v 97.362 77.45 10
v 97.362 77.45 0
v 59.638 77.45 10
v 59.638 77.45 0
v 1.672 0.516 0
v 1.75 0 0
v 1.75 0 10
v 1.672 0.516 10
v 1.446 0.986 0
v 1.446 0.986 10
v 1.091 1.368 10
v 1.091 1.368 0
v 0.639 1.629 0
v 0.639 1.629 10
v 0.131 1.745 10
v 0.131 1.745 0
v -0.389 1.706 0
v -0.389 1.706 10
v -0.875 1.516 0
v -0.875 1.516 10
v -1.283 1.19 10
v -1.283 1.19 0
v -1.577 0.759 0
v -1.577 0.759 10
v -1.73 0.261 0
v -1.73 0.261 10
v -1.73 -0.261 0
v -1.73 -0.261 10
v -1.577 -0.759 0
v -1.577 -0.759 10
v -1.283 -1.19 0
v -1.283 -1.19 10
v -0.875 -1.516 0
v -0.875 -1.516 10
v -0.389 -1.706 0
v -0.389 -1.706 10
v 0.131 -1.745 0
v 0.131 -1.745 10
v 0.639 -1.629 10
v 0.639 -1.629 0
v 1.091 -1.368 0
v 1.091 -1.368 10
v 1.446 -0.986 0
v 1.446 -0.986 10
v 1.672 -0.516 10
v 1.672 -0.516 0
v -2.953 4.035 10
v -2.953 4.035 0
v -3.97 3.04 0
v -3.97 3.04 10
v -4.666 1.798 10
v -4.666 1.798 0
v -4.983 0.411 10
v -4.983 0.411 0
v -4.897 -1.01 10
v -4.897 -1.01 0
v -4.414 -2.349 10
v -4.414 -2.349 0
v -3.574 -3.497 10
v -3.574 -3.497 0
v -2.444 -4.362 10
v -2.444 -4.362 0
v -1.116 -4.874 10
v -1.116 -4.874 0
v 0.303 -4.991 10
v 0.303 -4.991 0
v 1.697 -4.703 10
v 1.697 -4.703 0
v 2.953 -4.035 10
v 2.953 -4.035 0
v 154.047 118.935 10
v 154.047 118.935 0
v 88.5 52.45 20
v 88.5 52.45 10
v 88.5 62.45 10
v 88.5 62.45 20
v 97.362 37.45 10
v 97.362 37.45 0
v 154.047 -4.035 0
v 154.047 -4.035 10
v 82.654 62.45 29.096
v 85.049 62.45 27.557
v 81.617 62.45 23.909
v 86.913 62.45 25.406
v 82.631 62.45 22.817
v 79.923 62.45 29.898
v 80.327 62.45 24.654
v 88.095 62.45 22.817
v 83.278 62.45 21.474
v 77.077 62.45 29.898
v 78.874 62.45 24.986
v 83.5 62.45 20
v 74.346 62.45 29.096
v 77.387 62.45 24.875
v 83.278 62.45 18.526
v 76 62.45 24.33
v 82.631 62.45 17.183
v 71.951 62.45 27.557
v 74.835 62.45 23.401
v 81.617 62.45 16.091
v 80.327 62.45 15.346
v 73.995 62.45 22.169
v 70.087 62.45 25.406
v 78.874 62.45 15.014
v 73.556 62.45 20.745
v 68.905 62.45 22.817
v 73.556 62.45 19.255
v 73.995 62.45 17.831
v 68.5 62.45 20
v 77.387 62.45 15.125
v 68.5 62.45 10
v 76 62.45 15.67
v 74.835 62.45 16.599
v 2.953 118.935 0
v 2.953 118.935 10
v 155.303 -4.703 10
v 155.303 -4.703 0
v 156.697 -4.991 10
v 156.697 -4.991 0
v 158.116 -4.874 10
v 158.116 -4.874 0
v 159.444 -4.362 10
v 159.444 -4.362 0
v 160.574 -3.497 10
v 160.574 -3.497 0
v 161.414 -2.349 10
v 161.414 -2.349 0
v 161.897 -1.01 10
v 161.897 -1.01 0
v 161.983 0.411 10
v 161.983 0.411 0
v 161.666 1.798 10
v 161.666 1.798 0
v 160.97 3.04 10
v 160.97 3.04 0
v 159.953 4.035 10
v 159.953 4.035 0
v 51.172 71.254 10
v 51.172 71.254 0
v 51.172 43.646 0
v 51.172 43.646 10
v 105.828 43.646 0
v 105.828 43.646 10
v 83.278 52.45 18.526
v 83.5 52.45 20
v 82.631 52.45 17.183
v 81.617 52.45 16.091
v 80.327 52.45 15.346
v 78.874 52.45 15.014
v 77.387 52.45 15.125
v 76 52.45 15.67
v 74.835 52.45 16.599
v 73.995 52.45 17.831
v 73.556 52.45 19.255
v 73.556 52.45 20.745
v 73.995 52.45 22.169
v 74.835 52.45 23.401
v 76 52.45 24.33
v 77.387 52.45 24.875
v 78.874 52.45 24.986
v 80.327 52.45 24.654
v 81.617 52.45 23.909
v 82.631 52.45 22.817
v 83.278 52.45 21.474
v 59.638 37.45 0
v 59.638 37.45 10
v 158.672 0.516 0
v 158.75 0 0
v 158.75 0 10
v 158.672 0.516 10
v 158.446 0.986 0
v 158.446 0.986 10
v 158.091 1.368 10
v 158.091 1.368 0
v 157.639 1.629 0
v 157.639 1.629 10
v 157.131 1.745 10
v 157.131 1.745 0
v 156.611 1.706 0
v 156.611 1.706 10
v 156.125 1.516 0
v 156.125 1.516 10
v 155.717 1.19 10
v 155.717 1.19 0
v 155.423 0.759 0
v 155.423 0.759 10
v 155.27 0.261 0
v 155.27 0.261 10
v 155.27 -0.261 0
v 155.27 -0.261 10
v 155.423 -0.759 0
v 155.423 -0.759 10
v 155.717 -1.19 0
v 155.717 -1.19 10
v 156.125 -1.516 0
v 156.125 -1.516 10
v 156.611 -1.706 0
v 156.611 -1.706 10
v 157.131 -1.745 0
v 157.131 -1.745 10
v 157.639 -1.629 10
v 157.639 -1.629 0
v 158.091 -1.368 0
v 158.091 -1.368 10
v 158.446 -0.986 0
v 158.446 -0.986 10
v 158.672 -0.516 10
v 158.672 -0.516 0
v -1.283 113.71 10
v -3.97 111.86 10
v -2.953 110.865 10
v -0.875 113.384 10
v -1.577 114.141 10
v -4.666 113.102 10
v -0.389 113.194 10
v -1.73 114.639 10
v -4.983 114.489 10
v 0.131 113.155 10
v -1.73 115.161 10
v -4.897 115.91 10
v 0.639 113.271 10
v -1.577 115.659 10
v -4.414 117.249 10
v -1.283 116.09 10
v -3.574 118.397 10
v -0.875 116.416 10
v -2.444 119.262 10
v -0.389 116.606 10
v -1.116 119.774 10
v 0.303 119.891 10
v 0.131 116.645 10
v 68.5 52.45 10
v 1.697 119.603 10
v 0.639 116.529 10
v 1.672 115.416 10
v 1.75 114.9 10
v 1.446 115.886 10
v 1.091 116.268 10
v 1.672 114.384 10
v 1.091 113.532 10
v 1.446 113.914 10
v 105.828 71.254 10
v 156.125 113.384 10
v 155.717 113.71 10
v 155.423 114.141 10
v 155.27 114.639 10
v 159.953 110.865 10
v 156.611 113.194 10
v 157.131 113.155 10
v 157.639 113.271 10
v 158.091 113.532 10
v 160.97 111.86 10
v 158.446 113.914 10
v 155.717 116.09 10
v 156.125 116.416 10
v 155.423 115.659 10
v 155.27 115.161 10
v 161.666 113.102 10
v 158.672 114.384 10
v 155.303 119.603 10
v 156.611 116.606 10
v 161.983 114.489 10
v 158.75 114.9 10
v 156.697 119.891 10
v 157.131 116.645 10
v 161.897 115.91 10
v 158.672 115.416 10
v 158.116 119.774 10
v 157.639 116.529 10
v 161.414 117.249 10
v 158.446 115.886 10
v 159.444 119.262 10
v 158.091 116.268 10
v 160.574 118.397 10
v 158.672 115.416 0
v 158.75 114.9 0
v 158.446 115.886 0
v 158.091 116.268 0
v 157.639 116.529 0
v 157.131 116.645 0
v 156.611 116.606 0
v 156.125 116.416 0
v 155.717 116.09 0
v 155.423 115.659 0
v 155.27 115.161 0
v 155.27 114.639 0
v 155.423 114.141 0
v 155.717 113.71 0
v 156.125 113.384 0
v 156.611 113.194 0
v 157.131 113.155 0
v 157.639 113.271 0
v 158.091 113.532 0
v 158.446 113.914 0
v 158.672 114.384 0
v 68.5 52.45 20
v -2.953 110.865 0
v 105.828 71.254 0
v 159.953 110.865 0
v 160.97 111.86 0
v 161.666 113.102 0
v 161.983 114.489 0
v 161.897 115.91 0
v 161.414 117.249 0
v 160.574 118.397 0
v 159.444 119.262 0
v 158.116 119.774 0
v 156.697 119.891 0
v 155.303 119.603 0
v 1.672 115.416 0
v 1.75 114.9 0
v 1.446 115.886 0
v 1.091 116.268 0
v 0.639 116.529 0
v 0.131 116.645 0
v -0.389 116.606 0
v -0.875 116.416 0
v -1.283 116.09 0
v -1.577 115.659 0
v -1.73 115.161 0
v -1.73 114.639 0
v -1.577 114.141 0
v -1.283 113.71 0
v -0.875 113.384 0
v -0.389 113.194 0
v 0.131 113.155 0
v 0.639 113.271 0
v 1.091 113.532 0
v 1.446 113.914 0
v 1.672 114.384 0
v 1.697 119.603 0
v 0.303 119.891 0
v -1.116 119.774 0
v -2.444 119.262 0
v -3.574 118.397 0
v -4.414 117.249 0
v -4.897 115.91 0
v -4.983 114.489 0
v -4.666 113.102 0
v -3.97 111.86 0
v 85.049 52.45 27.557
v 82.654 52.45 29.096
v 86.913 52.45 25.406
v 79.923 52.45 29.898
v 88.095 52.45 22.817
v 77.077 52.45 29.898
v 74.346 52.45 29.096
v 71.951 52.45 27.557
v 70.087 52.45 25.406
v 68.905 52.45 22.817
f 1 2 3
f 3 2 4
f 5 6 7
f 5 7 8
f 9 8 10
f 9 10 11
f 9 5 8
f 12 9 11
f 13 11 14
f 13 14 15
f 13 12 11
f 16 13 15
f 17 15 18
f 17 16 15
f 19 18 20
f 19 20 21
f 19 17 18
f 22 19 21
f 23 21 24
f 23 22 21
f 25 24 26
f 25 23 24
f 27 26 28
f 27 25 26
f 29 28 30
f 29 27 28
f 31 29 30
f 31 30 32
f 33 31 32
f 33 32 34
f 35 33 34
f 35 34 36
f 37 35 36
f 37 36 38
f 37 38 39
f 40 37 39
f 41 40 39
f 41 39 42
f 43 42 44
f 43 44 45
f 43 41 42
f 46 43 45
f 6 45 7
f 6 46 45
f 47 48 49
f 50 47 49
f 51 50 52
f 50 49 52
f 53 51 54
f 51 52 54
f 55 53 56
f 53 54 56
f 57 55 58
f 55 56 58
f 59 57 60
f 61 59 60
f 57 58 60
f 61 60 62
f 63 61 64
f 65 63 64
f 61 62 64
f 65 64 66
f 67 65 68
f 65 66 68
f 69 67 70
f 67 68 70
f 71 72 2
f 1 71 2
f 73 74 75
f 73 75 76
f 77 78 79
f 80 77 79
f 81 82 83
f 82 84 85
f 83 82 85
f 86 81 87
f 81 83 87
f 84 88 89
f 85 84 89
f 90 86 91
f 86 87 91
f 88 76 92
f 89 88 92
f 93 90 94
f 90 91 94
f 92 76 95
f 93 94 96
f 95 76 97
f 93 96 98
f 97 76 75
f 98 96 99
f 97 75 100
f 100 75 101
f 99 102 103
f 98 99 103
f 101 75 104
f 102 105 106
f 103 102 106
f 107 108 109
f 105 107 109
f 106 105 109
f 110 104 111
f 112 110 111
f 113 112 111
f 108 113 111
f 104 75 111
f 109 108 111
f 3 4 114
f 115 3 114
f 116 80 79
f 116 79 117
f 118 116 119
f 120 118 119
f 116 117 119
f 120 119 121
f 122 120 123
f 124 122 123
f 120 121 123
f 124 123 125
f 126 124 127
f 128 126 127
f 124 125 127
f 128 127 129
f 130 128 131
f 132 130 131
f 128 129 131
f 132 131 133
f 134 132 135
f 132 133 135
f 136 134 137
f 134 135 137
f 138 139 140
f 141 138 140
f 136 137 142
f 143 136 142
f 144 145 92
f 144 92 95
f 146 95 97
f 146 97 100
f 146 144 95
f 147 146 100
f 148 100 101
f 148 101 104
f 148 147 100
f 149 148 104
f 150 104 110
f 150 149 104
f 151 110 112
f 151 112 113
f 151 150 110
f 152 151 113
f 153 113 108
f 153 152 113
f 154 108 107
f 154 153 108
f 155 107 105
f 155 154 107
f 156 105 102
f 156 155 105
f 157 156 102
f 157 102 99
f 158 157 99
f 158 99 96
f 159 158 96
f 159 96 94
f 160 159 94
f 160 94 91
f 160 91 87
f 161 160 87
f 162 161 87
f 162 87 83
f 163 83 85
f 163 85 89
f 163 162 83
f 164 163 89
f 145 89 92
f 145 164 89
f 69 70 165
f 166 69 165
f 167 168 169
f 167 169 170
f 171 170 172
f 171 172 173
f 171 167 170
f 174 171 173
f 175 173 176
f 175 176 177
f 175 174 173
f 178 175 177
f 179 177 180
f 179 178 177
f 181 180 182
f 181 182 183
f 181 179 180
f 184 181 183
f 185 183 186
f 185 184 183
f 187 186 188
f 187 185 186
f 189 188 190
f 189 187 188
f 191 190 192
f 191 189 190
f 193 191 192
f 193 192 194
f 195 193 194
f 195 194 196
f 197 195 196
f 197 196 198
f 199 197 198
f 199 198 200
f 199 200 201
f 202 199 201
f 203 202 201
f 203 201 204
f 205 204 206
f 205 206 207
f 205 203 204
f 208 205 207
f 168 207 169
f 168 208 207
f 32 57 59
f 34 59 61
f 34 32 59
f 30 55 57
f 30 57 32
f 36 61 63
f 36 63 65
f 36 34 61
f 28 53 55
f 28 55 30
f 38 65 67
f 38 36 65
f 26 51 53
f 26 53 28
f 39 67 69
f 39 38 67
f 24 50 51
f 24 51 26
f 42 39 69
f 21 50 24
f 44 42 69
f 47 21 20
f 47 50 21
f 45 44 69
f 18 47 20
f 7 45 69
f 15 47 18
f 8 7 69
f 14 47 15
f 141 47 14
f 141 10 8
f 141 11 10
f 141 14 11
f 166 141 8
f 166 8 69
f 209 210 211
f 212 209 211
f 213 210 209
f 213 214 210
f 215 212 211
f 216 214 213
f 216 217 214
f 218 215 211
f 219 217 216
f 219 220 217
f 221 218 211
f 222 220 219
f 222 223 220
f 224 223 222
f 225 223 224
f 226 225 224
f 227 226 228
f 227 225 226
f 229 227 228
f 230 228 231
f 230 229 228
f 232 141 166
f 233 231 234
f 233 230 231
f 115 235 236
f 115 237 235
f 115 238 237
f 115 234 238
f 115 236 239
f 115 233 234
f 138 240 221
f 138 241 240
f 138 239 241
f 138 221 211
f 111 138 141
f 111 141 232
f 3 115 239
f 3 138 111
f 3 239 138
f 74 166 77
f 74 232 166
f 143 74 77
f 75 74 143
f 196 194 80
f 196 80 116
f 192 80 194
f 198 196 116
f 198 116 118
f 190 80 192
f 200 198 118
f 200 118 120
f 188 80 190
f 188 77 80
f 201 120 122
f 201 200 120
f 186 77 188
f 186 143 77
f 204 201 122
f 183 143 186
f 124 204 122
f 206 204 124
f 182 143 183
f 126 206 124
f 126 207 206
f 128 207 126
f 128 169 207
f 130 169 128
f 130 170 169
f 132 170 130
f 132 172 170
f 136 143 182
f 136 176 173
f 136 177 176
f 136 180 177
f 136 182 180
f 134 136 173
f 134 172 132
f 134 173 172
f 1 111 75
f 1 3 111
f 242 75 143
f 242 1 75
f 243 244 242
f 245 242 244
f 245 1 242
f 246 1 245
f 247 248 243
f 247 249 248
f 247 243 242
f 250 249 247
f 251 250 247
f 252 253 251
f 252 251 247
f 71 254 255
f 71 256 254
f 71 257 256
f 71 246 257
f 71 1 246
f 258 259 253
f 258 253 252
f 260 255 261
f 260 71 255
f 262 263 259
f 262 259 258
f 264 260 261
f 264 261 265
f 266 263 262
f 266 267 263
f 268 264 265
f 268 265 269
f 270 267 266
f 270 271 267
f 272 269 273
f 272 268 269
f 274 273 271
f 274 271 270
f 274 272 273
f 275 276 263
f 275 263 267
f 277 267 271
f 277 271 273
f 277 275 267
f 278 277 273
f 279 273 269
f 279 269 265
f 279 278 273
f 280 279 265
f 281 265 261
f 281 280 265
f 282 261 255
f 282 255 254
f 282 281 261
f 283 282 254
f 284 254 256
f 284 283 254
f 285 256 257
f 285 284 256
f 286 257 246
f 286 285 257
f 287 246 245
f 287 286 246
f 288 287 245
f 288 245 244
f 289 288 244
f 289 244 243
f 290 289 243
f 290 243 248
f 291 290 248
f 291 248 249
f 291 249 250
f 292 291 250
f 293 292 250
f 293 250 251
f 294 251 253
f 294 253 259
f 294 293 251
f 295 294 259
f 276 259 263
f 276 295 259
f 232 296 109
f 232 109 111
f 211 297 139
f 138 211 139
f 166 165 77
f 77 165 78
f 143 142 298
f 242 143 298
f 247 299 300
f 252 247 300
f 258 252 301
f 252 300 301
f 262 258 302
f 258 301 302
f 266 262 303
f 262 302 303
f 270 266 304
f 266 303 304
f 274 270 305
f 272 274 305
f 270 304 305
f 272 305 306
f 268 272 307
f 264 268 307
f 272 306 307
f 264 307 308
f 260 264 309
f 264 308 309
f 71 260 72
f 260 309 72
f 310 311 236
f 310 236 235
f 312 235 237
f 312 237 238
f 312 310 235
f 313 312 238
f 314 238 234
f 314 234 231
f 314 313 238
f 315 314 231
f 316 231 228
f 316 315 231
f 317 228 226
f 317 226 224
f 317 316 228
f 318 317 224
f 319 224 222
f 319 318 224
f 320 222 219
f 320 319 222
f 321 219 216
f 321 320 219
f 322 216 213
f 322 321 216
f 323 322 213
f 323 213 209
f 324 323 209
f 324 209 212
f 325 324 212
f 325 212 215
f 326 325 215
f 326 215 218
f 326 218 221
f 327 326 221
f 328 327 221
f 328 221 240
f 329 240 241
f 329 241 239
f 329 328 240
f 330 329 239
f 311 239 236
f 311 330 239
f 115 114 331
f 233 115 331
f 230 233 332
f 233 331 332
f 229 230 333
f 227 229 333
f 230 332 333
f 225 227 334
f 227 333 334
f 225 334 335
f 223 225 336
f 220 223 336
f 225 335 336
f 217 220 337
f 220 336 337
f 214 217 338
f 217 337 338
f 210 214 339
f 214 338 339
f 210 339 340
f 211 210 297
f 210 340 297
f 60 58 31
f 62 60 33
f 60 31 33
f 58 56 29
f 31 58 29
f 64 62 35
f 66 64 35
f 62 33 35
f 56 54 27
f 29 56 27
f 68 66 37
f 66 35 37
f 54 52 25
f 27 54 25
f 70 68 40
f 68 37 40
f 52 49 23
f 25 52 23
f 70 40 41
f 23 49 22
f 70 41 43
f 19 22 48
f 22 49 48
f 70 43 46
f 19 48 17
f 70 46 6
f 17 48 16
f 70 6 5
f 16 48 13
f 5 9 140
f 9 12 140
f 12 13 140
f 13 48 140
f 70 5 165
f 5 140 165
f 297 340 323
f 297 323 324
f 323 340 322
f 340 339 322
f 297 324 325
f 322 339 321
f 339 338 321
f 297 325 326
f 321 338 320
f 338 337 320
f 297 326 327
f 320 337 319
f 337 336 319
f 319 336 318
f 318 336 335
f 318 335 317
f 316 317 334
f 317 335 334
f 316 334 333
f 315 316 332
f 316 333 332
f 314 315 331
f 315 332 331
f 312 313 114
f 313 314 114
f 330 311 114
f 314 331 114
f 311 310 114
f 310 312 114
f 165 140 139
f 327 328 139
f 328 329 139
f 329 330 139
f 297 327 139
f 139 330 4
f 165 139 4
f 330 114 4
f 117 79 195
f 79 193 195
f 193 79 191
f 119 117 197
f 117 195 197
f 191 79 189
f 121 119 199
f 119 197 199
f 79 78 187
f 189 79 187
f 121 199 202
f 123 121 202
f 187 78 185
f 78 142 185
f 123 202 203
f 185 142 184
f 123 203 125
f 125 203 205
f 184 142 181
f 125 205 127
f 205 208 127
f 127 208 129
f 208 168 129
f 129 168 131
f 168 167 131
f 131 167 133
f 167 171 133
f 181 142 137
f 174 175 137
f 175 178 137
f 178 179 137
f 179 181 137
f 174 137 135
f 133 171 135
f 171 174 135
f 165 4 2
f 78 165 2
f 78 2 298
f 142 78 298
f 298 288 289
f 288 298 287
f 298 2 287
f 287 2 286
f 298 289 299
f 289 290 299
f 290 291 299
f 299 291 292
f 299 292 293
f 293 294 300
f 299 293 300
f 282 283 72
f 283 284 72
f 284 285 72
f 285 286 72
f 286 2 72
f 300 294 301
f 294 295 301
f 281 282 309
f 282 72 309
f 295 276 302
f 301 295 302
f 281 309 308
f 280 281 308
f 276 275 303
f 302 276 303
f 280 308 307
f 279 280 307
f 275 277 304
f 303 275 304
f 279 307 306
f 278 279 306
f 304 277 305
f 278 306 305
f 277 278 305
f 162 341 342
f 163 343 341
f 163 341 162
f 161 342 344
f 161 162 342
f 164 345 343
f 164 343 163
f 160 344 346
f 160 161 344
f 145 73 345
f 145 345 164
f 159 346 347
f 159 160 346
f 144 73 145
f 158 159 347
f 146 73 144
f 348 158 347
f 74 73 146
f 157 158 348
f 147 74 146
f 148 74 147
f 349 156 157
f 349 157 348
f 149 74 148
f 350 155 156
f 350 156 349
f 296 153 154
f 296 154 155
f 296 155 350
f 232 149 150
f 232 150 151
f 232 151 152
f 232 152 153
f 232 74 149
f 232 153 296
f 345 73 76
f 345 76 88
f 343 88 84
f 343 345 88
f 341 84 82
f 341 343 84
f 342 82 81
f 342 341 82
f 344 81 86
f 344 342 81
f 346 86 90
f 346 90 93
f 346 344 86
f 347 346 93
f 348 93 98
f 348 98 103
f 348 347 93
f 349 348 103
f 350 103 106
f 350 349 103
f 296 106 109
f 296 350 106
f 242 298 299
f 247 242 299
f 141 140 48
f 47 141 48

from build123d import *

# Parameters (mm, degrees)
ESQUISSE1_R        = 1.75
BOSS_EXTRU_1_DEPTH = 10
BOSS_EXTRU_3_START = 15
ESQUISSE4_R        = 5
BOSS_EXTRU_3_DEPTH = 10


with BuildPart() as part:
    # Esquisse1 → Boss.-Extru.1 (new body)
    with BuildSketch(Plane.XY):
        with BuildLine():
            Line((-2.952917385, 110.865117237), (51.171888599, 71.254033112))
            Line((51.171888599, 71.254033112), (51.171888599, 43.645966888))
            Line((51.171888599, 43.645966888), (-2.952917385, 4.034882763))
            ThreePointArc((-2.952917385, 4.034882763), (-4.034882763, -2.952917385), (2.952917385, -4.034882763))
            Line((2.952917385, -4.034882763), (59.638092267, 37.45))
            Line((59.638092267, 37.45), (97.361907733, 37.45))
            Line((97.361907733, 37.45), (154.047082615, -4.034882763))
            ThreePointArc((154.047082615, -4.034882763), (161.034882763, -2.952917385), (159.952917385, 4.034882763))
            Line((159.952917385, 4.034882763), (105.828111401, 43.645966888))
            Line((105.828111401, 43.645966888), (105.828111401, 71.254033112))
            Line((105.828111401, 71.254033112), (159.952917385, 110.865117237))
            ThreePointArc((159.952917385, 110.865117237), (161.034882763, 117.852917385), (154.047082615, 118.934882763))
            Line((154.047082615, 118.934882763), (97.361907733, 77.45))
            Line((97.361907733, 77.45), (59.638092267, 77.45))
            Line((59.638092267, 77.45), (2.952917385, 118.934882763))
            ThreePointArc((2.952917385, 118.934882763), (-4.034882763, 117.852917385), (-2.952917385, 110.865117237))
        make_face()
        Circle(ESQUISSE1_R, mode=Mode.SUBTRACT)
        with Locations((0, 114.9)):
            Circle(ESQUISSE1_R, mode=Mode.SUBTRACT)
        with Locations((157, 0)):
            Circle(ESQUISSE1_R, mode=Mode.SUBTRACT)
        with Locations((157, 114.9)):
            Circle(ESQUISSE1_R, mode=Mode.SUBTRACT)
    extrude(amount=BOSS_EXTRU_1_DEPTH)

    # Esquisse4 → Boss.-Extru.3 (add)
    with BuildSketch(Plane(origin=(0, 37.45, 123.316242038), x_dir=(1, 0, 0), z_dir=(0, 1, 0)).offset(BOSS_EXTRU_3_START)):
        with BuildLine():
            Line((88.5, 113.316242038), (88.5, 103.316242038))
            ThreePointArc((88.5, 103.316242038), (78.5, 93.316242038), (68.5, 103.316242038))
            Line((68.5, 103.316242038), (68.5, 113.316242038))
            Line((68.5, 113.316242038), (88.5, 113.316242038))
        make_face()
        with Locations((78.5, 103.316242038)):
            Circle(ESQUISSE4_R, mode=Mode.SUBTRACT)
    extrude(amount=BOSS_EXTRU_3_DEPTH)


solid = part.part
